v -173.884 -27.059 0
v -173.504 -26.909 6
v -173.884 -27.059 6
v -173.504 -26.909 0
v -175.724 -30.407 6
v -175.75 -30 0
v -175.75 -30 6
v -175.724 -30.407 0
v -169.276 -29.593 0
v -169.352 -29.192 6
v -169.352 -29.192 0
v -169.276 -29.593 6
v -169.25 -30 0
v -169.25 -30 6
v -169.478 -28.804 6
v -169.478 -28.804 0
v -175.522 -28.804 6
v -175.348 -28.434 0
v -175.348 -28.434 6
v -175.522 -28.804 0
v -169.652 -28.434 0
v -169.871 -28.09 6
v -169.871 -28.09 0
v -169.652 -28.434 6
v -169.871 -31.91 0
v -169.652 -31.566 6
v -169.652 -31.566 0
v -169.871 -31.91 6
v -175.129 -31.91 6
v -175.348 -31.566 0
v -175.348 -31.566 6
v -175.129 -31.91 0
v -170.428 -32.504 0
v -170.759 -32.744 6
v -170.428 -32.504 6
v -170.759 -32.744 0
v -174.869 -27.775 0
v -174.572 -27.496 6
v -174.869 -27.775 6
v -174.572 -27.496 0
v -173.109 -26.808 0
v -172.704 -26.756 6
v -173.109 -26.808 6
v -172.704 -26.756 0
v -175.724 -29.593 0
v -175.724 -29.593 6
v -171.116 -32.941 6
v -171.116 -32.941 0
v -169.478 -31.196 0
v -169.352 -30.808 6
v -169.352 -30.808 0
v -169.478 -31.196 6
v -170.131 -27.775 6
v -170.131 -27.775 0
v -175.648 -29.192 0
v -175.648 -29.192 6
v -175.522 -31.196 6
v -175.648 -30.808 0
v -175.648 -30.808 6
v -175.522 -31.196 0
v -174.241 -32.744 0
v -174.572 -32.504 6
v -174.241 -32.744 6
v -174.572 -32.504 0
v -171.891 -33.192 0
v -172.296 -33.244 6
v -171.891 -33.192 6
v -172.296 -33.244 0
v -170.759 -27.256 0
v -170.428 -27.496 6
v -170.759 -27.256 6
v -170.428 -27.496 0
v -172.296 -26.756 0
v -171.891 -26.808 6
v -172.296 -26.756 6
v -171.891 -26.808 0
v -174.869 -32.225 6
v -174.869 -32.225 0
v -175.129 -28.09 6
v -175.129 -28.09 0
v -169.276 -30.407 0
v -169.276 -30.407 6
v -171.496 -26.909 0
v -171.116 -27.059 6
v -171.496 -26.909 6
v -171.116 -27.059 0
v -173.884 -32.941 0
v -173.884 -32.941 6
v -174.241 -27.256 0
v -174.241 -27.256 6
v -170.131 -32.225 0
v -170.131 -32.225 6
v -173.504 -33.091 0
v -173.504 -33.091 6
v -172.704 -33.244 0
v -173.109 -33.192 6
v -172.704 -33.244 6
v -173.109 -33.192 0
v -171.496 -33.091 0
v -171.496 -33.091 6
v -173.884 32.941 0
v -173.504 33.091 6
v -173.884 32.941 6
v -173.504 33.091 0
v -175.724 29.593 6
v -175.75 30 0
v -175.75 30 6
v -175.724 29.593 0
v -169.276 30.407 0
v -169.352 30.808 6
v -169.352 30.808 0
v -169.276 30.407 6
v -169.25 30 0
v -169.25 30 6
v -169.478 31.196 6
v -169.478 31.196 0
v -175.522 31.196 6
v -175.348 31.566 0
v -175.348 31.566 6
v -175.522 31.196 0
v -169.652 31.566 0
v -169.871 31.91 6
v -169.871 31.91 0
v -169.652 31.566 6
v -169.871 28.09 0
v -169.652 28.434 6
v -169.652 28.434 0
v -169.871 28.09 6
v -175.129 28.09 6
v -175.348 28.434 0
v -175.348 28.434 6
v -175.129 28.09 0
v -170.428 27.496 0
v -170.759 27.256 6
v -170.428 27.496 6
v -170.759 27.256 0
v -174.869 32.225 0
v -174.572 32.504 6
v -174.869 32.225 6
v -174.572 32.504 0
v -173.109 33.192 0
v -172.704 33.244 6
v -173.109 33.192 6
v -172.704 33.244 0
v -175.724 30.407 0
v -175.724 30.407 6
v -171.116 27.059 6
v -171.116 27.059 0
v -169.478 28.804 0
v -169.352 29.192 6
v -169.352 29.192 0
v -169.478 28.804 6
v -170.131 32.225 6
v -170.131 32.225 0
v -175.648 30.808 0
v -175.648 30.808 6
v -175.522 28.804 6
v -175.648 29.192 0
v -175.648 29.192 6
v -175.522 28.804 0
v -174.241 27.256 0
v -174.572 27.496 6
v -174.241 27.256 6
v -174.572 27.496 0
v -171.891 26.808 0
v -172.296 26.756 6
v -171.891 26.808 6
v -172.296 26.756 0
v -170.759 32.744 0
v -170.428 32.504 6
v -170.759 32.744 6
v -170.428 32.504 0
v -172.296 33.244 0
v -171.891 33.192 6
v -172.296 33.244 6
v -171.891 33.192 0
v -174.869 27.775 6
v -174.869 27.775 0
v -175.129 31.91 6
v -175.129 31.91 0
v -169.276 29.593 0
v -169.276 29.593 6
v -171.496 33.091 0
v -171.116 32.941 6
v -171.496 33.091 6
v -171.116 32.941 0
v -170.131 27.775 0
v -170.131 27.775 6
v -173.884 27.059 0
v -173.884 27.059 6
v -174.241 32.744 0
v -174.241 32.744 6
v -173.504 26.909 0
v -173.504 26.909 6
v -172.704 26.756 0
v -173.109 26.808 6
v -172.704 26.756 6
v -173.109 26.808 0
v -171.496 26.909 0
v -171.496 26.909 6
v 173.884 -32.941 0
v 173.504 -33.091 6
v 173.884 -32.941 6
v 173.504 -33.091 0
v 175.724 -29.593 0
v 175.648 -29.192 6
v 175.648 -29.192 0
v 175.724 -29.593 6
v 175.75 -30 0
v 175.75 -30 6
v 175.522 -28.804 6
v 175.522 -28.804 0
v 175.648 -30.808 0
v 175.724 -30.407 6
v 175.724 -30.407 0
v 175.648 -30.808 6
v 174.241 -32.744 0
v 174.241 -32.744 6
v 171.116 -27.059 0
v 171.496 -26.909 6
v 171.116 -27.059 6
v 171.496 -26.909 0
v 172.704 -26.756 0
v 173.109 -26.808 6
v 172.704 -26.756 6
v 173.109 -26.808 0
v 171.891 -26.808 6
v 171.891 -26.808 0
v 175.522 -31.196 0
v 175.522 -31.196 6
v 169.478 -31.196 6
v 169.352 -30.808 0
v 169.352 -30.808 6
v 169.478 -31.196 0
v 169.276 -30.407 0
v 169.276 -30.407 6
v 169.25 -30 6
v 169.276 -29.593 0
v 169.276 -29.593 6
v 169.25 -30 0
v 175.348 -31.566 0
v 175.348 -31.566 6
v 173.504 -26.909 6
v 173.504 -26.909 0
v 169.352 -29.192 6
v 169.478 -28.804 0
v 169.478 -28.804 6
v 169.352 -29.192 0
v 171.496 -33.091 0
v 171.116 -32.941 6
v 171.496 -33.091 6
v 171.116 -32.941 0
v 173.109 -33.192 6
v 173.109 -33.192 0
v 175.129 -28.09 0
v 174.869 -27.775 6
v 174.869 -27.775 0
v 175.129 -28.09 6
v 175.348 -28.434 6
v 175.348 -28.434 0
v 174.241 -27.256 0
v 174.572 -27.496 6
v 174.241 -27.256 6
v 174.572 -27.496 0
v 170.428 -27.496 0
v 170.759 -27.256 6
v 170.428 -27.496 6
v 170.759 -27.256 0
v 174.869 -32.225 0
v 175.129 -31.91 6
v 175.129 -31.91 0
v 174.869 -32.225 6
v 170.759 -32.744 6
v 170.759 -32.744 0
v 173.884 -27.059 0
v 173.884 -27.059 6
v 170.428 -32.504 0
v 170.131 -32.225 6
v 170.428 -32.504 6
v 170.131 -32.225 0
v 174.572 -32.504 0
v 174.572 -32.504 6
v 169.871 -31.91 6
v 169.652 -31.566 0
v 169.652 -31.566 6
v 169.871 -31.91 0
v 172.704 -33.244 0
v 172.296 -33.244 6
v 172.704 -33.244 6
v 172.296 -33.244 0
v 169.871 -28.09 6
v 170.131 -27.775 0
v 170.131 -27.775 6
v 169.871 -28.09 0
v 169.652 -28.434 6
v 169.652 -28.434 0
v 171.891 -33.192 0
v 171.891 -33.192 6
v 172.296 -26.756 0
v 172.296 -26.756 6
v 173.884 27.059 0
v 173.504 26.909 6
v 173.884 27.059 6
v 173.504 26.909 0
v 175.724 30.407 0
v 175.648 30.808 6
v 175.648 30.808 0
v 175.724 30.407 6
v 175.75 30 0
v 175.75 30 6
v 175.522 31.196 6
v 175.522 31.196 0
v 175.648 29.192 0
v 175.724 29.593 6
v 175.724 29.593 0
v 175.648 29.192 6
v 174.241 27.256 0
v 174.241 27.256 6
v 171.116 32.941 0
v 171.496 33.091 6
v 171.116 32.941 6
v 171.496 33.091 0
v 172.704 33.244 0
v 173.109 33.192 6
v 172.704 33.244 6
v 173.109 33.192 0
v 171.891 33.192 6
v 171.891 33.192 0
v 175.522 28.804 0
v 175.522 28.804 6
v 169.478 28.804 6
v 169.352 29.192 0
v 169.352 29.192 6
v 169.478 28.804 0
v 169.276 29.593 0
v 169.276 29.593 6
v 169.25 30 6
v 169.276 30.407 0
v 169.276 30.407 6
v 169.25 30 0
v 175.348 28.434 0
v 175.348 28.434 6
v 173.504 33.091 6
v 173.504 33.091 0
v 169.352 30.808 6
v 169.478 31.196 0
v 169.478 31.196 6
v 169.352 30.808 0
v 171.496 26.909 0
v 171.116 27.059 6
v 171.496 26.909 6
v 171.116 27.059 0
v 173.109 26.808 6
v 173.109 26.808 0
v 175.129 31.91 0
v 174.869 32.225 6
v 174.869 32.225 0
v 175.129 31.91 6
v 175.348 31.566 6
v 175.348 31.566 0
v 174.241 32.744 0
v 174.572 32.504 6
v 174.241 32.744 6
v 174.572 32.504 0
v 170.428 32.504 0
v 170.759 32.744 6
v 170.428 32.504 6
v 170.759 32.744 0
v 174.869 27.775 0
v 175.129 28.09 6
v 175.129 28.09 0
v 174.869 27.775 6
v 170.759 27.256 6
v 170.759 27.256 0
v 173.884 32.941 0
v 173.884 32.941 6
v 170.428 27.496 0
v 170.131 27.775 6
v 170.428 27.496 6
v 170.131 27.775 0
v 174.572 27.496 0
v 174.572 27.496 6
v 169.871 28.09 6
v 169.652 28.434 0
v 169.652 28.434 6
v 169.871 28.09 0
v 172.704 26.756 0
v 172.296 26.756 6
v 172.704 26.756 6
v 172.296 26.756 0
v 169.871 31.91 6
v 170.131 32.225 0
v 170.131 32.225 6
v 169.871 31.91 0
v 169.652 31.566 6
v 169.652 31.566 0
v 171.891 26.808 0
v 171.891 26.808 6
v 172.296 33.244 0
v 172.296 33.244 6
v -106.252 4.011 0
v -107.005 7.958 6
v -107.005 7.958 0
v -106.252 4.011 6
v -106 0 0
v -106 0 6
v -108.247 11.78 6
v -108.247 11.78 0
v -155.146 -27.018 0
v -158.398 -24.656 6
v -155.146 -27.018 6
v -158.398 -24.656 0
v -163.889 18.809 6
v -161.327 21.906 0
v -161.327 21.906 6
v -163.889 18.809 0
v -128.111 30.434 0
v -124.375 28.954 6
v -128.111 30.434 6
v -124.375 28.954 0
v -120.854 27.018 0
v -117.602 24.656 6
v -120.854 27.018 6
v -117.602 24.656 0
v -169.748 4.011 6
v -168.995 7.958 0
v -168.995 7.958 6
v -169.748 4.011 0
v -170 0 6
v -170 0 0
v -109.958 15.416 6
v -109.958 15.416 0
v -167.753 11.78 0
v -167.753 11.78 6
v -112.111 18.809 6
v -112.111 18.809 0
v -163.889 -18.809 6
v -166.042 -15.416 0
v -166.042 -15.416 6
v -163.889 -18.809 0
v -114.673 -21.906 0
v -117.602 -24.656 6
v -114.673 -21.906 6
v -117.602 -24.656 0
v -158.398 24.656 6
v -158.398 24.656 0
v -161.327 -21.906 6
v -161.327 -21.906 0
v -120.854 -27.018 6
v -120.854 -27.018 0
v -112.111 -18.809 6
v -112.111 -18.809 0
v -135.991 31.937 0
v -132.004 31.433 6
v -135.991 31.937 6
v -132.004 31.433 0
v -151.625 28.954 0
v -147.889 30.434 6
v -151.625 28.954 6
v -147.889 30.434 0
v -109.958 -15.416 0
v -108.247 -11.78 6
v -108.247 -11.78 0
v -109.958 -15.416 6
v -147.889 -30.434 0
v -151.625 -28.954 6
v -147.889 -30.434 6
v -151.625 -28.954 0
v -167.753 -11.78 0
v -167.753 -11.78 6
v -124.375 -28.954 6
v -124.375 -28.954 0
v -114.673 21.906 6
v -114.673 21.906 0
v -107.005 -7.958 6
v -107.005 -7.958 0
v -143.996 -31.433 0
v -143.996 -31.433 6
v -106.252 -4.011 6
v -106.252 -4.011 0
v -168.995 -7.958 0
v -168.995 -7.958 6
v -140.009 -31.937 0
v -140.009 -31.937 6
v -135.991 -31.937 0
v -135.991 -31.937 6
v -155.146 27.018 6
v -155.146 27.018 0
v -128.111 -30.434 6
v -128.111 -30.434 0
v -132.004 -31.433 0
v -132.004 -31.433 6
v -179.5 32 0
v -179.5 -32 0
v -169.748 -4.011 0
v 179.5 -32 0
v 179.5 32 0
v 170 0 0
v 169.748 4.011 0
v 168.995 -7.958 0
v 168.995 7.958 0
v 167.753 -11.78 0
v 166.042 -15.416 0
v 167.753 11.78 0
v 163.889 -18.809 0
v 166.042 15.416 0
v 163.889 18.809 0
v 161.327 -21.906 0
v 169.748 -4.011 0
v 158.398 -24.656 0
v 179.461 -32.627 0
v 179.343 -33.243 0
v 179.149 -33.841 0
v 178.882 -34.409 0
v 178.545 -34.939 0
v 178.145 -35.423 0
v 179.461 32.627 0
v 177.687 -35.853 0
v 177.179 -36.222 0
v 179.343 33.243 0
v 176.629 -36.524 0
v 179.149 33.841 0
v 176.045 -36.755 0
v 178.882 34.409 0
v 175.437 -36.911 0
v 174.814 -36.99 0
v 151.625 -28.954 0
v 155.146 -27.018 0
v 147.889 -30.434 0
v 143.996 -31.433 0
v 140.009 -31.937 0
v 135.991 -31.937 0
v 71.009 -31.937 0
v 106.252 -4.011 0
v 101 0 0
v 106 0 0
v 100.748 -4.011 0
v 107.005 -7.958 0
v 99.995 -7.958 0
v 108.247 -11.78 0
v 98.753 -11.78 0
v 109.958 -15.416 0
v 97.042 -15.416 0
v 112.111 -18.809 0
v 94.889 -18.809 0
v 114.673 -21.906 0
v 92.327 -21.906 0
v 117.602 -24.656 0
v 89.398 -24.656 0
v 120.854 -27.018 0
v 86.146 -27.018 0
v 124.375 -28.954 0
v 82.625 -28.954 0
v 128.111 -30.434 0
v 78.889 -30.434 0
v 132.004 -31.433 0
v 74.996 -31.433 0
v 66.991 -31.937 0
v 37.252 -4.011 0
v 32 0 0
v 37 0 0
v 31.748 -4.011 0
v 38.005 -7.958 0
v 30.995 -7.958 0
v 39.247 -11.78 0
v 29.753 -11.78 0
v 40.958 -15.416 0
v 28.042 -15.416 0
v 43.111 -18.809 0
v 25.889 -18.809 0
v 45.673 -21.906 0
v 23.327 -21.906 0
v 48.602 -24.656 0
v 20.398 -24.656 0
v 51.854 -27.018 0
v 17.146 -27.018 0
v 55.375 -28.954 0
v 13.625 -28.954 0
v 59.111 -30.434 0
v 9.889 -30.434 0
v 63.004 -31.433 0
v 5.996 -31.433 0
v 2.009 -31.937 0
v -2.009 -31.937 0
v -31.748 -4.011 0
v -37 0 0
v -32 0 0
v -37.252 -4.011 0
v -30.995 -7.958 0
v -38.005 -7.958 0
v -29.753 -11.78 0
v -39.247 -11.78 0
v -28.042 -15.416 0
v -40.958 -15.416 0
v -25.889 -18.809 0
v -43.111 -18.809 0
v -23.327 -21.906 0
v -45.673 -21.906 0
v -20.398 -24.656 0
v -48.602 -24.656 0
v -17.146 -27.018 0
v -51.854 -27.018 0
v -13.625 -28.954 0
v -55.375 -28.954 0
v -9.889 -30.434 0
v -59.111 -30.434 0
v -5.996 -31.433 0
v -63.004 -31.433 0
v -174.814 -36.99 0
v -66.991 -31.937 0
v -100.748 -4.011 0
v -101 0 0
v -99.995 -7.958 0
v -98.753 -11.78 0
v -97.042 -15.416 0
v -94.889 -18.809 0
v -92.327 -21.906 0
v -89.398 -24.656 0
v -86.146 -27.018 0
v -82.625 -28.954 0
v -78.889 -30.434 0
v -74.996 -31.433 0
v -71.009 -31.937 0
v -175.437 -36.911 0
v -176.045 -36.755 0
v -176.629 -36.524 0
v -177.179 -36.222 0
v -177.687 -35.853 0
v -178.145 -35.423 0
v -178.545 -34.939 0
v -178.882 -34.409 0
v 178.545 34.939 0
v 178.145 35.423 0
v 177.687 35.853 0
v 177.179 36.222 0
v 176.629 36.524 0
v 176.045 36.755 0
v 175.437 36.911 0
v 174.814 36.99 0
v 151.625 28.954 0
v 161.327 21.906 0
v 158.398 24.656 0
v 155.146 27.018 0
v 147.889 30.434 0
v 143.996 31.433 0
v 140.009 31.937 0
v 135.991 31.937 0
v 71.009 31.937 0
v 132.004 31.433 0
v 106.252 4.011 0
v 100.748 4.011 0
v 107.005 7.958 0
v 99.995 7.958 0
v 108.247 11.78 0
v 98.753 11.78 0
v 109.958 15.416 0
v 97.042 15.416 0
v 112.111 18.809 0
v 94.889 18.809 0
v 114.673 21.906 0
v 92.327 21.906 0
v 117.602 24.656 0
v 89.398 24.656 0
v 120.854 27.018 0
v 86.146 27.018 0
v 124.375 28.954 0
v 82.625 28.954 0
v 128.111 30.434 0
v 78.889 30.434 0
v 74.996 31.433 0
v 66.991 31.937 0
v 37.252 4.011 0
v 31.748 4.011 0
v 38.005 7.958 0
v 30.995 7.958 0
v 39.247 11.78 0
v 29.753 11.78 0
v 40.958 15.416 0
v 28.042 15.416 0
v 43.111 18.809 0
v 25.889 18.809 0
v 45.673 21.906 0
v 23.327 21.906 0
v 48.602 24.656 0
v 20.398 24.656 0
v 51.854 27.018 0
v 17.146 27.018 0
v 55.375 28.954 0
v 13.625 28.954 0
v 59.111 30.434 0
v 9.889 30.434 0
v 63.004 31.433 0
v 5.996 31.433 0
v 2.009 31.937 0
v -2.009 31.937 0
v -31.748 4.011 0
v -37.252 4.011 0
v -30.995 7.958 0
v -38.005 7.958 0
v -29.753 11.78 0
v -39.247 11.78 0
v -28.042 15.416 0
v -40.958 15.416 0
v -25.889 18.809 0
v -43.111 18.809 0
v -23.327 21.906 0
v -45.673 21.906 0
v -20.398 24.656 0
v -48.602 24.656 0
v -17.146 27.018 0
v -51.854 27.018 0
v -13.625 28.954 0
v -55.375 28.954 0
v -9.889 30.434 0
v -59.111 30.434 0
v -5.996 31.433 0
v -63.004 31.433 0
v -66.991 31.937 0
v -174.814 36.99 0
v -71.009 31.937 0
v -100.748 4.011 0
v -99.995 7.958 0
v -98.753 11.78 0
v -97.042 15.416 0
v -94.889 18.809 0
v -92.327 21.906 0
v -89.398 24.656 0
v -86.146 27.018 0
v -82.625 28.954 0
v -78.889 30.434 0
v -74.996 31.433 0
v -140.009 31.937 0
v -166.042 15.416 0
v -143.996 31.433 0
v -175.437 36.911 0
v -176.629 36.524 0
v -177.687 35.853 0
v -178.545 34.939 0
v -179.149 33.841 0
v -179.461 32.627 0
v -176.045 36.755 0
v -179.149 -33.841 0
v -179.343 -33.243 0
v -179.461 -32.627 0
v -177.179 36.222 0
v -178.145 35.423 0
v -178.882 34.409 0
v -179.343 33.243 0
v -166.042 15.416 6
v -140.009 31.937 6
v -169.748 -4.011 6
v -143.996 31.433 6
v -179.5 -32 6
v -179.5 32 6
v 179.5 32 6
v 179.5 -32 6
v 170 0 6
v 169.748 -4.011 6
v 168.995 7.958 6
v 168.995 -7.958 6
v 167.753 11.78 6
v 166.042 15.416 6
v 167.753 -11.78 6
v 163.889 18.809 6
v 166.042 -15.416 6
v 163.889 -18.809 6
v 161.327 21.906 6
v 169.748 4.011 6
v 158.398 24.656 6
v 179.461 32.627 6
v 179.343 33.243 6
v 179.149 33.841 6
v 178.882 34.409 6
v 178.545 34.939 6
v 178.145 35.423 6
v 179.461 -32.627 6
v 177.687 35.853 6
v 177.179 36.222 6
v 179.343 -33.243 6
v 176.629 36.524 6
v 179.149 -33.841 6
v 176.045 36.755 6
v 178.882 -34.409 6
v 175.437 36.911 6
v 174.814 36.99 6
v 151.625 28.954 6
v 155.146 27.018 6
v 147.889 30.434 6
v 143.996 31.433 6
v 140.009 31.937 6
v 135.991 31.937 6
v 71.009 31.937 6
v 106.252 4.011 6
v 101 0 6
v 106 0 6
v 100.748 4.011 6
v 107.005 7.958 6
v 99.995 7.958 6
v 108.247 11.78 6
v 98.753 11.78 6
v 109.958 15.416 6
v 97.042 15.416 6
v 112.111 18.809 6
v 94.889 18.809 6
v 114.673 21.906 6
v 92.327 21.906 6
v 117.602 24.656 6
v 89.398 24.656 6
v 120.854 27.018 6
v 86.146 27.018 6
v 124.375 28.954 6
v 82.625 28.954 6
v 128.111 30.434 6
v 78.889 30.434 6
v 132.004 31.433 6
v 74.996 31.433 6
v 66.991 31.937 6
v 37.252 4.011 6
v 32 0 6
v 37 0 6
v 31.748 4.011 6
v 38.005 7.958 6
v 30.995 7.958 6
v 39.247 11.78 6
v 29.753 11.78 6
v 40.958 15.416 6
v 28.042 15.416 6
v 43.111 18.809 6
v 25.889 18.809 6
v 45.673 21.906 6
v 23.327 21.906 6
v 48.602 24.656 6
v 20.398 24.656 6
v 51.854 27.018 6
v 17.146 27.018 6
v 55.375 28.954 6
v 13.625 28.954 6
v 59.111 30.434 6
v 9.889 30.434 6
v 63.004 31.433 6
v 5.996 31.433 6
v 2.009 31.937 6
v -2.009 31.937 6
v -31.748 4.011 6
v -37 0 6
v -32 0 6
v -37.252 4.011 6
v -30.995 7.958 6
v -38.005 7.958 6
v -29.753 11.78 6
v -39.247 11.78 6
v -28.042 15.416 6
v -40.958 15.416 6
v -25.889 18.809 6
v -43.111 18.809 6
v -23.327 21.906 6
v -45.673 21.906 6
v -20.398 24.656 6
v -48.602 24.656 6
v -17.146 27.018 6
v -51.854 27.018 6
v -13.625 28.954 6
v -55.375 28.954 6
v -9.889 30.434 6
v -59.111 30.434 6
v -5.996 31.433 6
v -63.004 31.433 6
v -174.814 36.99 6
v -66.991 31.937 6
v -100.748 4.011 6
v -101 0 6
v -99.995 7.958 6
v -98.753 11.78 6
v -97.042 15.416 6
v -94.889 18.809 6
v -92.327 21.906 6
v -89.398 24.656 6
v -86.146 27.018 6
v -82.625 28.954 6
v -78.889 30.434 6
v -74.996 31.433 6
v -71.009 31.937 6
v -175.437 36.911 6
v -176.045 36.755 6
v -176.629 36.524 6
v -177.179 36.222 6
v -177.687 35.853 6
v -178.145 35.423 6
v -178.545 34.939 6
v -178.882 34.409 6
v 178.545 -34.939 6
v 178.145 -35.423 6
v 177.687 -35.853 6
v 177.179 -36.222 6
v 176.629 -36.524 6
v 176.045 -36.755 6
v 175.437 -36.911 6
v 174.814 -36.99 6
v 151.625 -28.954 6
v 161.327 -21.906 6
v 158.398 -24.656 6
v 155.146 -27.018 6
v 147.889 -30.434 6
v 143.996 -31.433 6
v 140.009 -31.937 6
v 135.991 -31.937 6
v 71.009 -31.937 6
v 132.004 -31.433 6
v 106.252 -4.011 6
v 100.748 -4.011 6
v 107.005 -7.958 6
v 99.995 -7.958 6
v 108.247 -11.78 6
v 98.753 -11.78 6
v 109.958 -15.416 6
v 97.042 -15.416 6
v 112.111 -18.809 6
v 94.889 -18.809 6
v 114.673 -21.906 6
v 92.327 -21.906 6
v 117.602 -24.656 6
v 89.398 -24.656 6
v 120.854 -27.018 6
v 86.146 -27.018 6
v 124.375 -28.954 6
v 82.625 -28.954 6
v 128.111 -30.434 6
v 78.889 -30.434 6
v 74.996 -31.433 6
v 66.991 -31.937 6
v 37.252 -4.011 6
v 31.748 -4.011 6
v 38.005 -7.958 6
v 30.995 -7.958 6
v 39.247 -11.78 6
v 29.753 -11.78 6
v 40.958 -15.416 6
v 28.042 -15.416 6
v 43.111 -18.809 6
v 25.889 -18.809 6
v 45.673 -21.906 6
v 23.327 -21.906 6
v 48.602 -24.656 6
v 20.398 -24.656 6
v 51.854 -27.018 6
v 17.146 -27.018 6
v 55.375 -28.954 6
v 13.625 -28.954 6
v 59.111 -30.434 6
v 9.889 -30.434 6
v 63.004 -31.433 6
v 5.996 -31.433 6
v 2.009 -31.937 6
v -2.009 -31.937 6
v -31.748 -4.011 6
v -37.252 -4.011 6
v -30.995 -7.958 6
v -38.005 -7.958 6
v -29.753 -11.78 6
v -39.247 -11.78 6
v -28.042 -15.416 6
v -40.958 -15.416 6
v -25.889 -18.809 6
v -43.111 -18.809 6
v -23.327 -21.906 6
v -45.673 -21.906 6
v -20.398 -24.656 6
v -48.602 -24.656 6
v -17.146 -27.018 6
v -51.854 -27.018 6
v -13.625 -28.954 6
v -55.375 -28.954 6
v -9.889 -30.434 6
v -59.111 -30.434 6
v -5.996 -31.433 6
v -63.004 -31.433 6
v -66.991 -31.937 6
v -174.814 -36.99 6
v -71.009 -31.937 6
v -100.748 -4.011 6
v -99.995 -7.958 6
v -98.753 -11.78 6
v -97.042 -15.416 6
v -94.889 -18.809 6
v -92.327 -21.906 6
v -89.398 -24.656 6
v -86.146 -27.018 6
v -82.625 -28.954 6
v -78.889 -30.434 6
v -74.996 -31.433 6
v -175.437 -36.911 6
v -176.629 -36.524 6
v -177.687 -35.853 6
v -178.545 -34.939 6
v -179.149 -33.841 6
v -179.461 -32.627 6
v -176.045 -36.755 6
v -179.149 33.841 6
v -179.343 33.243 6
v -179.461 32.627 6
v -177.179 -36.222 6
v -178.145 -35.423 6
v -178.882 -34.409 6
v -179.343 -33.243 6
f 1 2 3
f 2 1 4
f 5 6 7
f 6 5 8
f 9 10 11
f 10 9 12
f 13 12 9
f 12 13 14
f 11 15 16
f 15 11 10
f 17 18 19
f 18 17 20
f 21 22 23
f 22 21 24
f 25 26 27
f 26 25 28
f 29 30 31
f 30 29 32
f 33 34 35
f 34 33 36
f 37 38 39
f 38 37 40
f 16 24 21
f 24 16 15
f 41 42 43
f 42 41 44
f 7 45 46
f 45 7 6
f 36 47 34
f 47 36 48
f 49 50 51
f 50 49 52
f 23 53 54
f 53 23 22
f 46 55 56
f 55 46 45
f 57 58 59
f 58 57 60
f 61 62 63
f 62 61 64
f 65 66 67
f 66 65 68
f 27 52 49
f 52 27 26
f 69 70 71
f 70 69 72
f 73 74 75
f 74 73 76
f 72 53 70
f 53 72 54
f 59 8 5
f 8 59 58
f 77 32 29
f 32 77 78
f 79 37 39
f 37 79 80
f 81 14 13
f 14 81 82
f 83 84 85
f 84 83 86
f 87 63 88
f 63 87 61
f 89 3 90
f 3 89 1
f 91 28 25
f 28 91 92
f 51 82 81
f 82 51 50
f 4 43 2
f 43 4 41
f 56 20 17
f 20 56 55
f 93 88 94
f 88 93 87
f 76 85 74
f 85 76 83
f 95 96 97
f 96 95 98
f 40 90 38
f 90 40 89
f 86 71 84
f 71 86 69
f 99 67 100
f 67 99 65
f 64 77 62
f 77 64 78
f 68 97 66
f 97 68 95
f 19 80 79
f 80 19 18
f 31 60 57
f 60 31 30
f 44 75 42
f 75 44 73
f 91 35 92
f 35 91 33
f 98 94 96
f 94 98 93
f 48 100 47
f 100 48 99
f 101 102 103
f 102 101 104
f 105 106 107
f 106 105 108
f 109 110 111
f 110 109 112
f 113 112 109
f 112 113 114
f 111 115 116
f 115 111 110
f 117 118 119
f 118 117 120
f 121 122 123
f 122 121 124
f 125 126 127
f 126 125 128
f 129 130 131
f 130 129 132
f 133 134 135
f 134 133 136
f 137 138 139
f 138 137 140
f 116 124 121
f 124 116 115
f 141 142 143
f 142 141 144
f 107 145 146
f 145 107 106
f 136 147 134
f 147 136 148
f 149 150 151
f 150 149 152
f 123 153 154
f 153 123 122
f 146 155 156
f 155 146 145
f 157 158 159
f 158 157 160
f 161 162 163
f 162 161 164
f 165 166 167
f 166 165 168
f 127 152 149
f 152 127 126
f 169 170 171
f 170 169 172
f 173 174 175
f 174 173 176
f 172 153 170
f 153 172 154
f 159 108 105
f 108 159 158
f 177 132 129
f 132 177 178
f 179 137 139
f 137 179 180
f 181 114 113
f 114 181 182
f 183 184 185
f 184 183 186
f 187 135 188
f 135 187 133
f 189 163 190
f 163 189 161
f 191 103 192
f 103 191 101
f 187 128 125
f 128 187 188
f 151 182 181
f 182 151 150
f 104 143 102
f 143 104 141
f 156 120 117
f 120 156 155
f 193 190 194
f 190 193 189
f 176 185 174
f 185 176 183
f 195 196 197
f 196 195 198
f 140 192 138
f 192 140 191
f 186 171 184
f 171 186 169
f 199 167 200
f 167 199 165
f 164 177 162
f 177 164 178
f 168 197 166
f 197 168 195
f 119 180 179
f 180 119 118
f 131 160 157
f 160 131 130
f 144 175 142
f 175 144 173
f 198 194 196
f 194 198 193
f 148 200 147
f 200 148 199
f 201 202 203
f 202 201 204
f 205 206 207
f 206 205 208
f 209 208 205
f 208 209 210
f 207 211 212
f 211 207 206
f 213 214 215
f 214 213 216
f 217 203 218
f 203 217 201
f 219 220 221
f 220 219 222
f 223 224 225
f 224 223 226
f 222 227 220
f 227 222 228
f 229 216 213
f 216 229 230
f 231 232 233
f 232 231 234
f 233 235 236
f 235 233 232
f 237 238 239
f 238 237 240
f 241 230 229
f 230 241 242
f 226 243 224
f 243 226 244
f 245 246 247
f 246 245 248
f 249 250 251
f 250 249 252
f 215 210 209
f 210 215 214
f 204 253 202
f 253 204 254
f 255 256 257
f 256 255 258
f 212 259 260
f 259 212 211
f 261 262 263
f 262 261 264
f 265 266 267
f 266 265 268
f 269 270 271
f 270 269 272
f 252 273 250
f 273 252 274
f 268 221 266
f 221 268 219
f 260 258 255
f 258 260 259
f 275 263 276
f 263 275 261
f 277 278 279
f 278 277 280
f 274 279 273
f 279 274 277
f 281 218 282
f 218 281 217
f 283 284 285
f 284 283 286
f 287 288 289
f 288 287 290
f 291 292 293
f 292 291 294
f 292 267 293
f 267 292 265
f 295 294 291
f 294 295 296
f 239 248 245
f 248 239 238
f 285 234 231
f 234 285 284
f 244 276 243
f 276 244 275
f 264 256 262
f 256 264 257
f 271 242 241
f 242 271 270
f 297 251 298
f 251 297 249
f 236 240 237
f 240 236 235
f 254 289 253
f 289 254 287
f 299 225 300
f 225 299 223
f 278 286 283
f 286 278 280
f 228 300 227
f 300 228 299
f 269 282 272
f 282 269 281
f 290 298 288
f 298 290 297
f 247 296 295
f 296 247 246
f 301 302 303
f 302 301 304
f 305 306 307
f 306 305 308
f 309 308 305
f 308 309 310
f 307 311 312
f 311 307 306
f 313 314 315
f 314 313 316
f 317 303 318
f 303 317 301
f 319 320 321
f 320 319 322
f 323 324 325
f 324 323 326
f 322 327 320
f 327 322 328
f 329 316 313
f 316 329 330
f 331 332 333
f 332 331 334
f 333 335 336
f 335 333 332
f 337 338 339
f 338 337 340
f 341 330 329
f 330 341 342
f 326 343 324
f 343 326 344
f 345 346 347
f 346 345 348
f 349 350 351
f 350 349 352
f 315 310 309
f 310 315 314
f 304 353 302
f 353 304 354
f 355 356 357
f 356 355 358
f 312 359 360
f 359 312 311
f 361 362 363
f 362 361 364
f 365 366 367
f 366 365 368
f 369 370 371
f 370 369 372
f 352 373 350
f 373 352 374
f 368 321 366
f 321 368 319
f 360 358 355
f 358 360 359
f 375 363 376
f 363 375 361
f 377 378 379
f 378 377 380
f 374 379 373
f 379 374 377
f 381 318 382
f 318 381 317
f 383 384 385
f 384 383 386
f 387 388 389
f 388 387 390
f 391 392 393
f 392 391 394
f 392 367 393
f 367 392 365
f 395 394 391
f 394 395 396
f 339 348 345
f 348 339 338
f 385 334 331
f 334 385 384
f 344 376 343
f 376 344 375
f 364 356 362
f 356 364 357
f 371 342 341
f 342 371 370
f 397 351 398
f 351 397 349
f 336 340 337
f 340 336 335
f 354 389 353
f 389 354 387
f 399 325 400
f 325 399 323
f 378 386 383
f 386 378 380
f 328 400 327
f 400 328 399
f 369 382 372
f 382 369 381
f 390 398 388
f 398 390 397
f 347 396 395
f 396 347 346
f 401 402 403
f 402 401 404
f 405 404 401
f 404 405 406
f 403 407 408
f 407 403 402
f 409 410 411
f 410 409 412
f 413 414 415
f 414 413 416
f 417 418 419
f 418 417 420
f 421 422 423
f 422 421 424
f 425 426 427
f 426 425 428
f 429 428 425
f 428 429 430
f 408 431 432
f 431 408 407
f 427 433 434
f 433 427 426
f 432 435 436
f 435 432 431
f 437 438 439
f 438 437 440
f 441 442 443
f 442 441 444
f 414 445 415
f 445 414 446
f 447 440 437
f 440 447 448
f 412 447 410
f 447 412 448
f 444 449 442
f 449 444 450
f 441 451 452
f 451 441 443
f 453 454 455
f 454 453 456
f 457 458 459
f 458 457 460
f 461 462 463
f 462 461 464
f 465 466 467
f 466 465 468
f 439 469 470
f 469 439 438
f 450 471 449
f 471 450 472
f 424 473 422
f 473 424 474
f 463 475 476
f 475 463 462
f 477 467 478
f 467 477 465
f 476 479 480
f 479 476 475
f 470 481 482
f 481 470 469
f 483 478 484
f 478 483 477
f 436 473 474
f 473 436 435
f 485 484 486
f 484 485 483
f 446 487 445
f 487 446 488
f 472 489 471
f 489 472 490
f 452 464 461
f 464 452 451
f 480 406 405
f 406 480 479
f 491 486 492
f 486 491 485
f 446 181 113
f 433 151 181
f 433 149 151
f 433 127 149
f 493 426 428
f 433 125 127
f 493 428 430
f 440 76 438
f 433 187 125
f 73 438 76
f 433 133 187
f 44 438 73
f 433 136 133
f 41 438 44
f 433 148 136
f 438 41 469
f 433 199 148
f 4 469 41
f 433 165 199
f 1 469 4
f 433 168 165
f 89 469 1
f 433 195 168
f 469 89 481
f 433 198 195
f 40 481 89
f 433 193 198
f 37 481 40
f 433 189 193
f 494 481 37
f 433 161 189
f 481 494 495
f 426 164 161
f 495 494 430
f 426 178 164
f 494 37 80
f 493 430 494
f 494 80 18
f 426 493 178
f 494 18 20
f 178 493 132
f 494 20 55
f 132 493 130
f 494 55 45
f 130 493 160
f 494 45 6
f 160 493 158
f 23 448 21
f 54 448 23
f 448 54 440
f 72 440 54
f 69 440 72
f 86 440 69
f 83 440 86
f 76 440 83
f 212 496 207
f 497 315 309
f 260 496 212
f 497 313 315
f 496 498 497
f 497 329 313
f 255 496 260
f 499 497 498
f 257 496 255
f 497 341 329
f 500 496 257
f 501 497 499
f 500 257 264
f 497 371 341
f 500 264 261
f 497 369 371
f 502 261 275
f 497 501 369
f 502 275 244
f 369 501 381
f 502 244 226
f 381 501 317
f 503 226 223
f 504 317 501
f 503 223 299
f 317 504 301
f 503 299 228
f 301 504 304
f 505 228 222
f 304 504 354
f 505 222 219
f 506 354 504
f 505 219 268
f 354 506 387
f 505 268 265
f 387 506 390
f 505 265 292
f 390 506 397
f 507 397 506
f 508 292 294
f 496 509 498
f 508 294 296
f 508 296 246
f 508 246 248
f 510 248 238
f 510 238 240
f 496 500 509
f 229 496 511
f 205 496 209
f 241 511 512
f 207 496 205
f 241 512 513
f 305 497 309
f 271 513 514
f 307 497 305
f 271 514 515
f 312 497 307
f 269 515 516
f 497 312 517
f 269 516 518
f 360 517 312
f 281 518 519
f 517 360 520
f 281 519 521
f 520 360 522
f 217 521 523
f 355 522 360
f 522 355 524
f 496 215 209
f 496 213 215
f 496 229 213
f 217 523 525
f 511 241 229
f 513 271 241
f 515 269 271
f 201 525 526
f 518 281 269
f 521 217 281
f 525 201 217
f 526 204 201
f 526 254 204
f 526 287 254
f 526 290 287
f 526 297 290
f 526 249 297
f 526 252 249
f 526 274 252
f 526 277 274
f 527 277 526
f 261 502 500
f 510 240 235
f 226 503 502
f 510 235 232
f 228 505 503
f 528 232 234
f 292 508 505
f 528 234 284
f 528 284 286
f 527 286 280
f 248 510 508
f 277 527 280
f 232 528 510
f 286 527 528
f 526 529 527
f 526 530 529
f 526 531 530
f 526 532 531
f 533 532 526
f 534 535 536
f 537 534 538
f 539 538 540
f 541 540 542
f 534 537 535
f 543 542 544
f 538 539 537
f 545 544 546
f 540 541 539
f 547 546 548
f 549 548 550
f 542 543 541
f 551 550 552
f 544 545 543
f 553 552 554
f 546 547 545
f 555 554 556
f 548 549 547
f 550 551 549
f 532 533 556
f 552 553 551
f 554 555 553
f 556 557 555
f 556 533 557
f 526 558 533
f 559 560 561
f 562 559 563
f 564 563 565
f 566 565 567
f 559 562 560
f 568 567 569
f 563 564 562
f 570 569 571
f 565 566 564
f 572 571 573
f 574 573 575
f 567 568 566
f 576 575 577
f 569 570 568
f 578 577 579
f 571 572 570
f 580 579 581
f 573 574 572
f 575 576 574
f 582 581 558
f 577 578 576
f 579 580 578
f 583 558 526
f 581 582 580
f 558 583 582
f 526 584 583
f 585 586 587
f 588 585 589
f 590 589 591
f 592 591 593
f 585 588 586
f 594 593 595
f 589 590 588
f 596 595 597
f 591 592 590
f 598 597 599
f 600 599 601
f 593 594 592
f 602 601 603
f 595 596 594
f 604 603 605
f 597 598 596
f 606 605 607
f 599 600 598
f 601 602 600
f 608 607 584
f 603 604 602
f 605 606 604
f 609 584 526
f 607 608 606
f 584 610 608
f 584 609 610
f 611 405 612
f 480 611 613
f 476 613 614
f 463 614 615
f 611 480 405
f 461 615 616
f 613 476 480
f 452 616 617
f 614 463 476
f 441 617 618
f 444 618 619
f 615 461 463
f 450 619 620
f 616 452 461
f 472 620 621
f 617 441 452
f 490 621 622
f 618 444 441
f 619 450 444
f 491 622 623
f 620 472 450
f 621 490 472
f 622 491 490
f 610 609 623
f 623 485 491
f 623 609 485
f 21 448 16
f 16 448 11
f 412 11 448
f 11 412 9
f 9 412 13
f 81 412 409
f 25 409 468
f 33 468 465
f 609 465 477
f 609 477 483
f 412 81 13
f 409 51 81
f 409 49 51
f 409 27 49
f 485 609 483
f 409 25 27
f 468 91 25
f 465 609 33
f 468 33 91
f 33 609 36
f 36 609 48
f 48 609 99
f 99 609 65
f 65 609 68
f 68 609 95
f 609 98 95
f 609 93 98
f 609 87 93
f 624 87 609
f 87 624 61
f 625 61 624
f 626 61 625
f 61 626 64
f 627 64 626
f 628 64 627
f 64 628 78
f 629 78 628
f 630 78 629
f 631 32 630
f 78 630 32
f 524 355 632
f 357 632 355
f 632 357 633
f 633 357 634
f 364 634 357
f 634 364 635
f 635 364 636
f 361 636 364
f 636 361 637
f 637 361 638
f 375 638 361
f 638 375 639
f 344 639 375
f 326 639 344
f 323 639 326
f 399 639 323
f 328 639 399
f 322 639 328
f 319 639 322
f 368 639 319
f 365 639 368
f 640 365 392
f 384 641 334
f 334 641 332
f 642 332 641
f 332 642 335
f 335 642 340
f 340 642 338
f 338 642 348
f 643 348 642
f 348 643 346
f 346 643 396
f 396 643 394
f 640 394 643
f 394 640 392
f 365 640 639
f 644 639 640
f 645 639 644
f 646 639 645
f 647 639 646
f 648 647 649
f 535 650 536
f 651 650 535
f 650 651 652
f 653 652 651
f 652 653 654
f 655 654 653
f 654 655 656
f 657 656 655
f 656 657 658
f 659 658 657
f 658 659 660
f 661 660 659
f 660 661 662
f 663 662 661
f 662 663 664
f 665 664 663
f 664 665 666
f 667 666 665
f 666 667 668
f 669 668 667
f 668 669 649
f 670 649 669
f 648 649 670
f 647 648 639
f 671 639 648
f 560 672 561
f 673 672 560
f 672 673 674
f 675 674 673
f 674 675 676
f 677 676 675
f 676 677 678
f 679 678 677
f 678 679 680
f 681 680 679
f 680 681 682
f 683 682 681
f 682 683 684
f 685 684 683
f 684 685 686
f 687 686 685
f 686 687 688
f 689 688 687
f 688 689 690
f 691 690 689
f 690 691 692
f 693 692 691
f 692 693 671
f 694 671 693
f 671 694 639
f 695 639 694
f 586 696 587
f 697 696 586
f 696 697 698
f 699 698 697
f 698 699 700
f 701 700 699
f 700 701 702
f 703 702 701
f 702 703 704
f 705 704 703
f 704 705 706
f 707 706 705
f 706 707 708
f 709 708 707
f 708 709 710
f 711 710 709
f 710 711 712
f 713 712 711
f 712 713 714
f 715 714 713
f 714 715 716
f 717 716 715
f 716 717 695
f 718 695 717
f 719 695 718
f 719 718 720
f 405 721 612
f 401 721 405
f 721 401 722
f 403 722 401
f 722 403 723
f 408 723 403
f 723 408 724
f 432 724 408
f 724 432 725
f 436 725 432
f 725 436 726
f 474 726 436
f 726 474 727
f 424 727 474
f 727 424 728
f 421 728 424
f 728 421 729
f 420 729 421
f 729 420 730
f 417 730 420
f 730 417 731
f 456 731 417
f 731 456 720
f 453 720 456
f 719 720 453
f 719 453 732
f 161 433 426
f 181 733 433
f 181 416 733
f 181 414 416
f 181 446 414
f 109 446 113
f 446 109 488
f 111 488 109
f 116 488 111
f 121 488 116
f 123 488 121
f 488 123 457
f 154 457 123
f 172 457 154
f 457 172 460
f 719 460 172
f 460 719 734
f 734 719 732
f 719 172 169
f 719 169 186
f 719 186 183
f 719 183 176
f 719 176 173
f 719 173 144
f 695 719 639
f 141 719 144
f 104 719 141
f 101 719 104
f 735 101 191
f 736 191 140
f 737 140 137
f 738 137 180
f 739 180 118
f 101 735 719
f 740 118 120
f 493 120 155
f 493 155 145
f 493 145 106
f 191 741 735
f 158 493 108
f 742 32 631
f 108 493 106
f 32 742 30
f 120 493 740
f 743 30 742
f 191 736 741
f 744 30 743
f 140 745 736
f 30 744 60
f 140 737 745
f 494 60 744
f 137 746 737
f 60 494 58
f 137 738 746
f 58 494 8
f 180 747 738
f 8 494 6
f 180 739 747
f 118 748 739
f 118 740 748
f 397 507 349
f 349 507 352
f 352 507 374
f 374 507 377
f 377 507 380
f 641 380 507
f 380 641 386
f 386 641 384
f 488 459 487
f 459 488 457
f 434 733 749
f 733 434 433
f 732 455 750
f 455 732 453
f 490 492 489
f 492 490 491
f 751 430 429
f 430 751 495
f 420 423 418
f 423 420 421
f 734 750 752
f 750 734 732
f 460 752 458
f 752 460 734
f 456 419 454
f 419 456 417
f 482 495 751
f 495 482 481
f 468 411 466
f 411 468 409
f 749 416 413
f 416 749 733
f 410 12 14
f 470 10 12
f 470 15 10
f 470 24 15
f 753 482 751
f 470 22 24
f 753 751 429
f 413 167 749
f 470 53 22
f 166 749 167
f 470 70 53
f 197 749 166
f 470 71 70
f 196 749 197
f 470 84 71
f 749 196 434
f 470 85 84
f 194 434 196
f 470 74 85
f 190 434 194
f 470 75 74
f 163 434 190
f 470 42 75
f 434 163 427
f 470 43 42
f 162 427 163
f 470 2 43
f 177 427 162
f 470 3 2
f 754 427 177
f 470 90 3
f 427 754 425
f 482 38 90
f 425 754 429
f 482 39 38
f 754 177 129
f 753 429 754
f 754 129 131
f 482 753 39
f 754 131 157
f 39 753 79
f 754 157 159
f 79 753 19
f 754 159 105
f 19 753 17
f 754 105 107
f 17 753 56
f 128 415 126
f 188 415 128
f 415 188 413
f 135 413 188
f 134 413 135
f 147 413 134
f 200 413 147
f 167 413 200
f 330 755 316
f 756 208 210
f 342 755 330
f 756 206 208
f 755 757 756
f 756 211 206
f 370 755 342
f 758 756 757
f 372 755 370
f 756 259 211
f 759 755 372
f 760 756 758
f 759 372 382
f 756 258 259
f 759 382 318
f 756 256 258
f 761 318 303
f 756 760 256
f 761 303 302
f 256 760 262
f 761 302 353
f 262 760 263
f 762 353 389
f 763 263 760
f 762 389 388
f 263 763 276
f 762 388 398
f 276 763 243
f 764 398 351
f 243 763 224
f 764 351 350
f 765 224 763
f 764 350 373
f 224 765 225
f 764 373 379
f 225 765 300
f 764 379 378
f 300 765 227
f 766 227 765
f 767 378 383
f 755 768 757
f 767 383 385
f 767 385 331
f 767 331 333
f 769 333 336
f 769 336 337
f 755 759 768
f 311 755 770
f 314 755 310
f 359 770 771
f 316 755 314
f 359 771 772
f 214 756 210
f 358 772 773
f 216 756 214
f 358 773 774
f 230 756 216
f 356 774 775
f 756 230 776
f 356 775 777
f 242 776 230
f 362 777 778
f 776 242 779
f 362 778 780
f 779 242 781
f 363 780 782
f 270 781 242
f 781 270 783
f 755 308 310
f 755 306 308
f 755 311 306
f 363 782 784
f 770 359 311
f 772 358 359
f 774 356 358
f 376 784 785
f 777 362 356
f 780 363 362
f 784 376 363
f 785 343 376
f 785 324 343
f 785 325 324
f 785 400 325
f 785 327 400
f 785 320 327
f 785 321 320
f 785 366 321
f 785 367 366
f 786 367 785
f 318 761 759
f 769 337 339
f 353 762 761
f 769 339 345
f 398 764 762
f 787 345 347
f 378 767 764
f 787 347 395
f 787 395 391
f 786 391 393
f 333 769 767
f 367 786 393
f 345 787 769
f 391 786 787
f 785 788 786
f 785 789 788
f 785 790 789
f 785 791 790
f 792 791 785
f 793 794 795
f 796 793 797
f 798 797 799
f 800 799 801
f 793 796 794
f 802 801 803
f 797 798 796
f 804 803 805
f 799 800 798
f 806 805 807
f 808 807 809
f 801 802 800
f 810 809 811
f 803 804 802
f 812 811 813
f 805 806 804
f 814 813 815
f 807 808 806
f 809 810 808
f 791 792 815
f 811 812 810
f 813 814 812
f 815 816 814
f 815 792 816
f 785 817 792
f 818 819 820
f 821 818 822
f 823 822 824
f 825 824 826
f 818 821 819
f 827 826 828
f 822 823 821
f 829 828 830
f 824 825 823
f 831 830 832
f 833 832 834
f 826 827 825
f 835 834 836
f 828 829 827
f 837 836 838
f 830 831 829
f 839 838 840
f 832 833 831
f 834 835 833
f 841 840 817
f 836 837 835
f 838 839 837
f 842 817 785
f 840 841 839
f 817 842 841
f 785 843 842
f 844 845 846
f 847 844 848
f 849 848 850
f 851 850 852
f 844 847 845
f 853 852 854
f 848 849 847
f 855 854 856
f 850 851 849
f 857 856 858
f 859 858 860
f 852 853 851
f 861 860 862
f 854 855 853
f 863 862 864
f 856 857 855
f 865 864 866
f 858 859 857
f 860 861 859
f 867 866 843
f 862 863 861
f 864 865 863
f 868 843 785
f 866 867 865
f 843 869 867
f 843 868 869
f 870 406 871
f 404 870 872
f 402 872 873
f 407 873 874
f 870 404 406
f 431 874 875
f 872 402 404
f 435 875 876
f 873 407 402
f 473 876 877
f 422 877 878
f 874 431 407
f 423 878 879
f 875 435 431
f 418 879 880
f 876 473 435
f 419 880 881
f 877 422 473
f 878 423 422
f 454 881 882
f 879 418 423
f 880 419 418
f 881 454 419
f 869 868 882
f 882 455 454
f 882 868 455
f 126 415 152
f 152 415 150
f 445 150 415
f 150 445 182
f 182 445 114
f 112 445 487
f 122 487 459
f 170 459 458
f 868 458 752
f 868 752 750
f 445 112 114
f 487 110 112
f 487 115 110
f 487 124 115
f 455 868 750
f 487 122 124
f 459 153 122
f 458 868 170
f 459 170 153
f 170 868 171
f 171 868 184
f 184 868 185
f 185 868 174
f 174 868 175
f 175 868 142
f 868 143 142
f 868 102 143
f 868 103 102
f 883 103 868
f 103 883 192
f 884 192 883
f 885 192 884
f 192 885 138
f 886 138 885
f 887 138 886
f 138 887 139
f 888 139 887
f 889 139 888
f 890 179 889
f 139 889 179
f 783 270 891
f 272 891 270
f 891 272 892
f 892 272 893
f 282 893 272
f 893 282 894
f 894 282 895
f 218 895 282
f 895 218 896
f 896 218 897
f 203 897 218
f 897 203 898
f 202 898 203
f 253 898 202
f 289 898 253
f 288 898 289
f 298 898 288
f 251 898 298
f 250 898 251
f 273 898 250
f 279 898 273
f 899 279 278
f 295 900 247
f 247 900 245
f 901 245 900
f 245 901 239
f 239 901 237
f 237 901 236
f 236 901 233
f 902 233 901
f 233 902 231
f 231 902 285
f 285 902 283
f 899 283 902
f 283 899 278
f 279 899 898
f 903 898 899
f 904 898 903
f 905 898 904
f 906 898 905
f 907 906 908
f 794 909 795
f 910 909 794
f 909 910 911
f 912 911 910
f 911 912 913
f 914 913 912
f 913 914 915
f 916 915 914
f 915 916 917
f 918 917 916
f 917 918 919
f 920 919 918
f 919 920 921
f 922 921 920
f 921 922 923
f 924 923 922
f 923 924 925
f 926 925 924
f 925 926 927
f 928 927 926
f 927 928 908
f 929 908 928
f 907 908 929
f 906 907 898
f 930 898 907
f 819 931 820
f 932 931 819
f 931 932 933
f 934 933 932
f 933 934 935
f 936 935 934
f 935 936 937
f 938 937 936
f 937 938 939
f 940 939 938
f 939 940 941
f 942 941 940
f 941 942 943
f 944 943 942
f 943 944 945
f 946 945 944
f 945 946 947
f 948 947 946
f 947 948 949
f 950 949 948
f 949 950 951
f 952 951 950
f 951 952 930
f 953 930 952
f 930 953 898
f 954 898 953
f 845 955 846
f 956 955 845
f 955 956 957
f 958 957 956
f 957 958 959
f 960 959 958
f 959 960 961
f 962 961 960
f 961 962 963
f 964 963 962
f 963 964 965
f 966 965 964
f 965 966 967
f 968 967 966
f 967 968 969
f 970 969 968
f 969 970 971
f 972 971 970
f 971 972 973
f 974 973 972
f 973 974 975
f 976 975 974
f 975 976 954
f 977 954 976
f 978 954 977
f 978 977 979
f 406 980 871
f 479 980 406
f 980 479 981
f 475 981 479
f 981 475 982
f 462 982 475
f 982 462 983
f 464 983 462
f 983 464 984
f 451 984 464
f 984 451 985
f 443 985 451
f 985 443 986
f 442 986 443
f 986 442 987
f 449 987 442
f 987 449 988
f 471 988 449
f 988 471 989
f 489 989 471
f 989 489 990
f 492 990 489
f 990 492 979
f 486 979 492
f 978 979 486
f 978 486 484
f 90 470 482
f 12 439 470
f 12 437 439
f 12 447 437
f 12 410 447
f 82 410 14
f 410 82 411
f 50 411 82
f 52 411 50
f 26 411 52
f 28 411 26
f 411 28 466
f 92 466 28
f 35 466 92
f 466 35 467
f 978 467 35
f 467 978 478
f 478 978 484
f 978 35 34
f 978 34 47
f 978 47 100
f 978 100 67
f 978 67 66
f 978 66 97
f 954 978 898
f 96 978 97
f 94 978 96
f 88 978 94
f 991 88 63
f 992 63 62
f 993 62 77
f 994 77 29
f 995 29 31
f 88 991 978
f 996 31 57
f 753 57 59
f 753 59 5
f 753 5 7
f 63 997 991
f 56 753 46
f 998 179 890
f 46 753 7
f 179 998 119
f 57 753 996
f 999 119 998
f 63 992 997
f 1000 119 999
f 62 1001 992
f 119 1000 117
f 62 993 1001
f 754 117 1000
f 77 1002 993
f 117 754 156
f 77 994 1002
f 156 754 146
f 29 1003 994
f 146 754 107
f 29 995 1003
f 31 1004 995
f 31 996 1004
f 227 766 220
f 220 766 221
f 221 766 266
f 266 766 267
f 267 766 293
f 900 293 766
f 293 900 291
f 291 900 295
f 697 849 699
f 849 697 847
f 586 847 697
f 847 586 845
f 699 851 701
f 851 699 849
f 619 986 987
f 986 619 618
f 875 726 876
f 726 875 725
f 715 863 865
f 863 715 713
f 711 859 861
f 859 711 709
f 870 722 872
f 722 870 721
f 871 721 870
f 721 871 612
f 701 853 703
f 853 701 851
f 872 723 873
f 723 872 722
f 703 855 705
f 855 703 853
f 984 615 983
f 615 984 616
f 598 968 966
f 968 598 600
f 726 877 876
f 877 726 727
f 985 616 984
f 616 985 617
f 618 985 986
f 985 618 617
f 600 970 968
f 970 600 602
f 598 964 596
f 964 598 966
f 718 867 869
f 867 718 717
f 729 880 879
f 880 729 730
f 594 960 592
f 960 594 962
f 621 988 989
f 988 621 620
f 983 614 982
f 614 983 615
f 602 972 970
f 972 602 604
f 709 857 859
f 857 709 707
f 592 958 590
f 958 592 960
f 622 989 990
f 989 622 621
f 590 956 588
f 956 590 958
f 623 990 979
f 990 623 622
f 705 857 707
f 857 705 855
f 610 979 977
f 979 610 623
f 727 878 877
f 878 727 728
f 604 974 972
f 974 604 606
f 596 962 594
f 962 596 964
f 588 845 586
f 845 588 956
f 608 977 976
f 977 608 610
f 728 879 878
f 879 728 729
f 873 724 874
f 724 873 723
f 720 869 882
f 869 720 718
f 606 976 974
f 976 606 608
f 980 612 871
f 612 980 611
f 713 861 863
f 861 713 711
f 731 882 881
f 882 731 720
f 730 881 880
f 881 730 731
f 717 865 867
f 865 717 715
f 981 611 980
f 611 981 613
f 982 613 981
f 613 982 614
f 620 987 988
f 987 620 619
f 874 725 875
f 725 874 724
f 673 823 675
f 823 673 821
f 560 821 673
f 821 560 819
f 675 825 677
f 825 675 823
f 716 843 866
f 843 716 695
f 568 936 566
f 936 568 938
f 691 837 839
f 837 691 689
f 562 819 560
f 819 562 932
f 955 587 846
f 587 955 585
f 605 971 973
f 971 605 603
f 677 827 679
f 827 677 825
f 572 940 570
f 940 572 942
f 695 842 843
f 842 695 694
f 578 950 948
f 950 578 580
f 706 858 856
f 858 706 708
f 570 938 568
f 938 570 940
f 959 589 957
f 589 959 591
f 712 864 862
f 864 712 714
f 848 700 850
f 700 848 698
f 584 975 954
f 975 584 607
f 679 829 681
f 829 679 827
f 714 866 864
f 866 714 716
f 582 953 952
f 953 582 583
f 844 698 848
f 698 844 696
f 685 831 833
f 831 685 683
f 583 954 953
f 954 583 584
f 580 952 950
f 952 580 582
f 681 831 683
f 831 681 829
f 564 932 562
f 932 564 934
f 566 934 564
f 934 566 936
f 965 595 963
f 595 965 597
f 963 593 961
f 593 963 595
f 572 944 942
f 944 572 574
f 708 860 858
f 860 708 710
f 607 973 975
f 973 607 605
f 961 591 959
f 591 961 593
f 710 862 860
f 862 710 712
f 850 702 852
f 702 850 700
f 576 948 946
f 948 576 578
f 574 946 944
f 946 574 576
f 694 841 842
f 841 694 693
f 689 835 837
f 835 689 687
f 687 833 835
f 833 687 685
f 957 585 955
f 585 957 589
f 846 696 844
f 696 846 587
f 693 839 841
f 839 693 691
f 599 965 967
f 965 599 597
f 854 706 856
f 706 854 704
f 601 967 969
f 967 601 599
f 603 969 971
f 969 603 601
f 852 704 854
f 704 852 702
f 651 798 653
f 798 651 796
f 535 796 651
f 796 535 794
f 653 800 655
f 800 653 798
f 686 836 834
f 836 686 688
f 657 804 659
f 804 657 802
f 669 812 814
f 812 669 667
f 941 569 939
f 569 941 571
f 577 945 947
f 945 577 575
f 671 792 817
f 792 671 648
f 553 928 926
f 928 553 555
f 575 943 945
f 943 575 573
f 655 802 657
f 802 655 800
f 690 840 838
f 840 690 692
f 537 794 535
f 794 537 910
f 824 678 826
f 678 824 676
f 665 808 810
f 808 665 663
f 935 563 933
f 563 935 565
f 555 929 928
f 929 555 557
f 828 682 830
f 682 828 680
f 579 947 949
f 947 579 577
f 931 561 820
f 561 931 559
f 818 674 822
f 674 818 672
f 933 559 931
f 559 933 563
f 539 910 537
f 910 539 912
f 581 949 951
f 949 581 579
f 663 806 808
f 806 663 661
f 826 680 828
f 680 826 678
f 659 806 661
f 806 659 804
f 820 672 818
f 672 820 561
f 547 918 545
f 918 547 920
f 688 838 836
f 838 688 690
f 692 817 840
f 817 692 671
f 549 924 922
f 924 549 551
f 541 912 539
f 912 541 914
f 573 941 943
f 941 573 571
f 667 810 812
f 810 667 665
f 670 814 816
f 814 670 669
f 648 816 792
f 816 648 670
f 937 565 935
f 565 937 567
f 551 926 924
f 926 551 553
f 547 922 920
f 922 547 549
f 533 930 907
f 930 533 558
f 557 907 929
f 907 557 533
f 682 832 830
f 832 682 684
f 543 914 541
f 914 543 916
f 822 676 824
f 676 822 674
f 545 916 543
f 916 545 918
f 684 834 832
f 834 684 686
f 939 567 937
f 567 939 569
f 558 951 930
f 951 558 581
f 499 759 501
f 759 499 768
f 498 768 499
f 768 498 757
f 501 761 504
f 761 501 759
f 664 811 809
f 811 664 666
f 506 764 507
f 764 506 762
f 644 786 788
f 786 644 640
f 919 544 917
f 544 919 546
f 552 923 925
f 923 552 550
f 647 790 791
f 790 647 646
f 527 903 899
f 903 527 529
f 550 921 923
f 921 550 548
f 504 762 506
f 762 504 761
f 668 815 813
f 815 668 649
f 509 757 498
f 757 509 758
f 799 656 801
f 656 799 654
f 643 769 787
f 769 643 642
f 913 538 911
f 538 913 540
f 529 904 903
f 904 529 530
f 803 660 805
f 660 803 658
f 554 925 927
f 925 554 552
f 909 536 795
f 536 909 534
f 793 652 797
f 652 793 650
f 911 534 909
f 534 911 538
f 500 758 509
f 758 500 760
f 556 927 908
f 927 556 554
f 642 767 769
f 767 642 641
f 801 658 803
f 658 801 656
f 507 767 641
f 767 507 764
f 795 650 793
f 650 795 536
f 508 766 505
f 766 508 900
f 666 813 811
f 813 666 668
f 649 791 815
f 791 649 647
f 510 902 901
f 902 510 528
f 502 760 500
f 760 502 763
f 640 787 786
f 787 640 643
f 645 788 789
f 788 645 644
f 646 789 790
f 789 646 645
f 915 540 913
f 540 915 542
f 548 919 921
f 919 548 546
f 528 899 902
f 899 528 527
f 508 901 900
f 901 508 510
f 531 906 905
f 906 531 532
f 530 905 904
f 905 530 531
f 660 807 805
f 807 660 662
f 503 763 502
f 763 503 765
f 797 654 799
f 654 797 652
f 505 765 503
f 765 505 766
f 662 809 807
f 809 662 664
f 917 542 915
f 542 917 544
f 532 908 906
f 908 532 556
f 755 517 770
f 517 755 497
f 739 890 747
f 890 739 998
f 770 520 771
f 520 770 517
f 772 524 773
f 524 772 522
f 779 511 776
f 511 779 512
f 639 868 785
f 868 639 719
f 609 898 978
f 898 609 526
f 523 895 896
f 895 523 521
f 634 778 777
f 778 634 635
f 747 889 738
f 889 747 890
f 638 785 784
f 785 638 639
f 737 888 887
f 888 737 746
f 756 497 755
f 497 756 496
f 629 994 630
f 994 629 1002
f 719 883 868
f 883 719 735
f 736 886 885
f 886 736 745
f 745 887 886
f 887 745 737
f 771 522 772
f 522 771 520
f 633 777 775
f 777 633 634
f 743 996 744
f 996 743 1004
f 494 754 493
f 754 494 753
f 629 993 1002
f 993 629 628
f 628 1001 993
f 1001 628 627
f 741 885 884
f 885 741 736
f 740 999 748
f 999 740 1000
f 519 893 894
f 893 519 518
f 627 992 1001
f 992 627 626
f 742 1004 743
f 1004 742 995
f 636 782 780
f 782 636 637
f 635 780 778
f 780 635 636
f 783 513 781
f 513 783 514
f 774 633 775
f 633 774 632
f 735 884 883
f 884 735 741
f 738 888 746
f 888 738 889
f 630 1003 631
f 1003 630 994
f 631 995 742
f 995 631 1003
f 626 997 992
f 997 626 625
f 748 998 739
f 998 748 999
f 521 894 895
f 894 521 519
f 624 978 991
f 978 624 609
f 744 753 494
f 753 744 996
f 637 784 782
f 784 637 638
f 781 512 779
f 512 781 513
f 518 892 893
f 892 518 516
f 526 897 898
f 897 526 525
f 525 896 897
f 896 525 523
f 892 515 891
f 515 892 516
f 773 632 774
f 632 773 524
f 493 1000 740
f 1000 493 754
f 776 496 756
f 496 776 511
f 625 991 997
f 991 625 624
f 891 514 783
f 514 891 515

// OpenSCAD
$fn = 50;


difference() {
	union() {
		hull() {
			translate(v = [-174.5000000000, 32.0000000000, 0]) {
				cylinder(h = 6, r = 5);
			}
			translate(v = [174.5000000000, 32.0000000000, 0]) {
				cylinder(h = 6, r = 5);
			}
			translate(v = [-174.5000000000, -32.0000000000, 0]) {
				cylinder(h = 6, r = 5);
			}
			translate(v = [174.5000000000, -32.0000000000, 0]) {
				cylinder(h = 6, r = 5);
			}
		}
	}
	union() {
		#translate(v = [-172.5000000000, -30.0000000000, -100.0000000000]) {
			cylinder(h = 200, r = 3.2500000000);
		}
		#translate(v = [-172.5000000000, 30.0000000000, -100.0000000000]) {
			cylinder(h = 200, r = 3.2500000000);
		}
		#translate(v = [172.5000000000, -30.0000000000, -100.0000000000]) {
			cylinder(h = 200, r = 3.2500000000);
		}
		#translate(v = [172.5000000000, 30.0000000000, -100.0000000000]) {
			cylinder(h = 200, r = 3.2500000000);
		}
		#translate(v = [-138.0000000000, 0, 0]) {
			cylinder(h = 6, r = 32.0000000000);
		}
		#translate(v = [-69.0000000000, 0, 0]) {
			cylinder(h = 6, r = 32.0000000000);
		}
		#cylinder(h = 6, r = 32.0000000000);
		#translate(v = [69.0000000000, 0, 0]) {
			cylinder(h = 6, r = 32.0000000000);
		}
		#translate(v = [138.0000000000, 0, 0]) {
			cylinder(h = 6, r = 32.0000000000);
		}
	}
}
